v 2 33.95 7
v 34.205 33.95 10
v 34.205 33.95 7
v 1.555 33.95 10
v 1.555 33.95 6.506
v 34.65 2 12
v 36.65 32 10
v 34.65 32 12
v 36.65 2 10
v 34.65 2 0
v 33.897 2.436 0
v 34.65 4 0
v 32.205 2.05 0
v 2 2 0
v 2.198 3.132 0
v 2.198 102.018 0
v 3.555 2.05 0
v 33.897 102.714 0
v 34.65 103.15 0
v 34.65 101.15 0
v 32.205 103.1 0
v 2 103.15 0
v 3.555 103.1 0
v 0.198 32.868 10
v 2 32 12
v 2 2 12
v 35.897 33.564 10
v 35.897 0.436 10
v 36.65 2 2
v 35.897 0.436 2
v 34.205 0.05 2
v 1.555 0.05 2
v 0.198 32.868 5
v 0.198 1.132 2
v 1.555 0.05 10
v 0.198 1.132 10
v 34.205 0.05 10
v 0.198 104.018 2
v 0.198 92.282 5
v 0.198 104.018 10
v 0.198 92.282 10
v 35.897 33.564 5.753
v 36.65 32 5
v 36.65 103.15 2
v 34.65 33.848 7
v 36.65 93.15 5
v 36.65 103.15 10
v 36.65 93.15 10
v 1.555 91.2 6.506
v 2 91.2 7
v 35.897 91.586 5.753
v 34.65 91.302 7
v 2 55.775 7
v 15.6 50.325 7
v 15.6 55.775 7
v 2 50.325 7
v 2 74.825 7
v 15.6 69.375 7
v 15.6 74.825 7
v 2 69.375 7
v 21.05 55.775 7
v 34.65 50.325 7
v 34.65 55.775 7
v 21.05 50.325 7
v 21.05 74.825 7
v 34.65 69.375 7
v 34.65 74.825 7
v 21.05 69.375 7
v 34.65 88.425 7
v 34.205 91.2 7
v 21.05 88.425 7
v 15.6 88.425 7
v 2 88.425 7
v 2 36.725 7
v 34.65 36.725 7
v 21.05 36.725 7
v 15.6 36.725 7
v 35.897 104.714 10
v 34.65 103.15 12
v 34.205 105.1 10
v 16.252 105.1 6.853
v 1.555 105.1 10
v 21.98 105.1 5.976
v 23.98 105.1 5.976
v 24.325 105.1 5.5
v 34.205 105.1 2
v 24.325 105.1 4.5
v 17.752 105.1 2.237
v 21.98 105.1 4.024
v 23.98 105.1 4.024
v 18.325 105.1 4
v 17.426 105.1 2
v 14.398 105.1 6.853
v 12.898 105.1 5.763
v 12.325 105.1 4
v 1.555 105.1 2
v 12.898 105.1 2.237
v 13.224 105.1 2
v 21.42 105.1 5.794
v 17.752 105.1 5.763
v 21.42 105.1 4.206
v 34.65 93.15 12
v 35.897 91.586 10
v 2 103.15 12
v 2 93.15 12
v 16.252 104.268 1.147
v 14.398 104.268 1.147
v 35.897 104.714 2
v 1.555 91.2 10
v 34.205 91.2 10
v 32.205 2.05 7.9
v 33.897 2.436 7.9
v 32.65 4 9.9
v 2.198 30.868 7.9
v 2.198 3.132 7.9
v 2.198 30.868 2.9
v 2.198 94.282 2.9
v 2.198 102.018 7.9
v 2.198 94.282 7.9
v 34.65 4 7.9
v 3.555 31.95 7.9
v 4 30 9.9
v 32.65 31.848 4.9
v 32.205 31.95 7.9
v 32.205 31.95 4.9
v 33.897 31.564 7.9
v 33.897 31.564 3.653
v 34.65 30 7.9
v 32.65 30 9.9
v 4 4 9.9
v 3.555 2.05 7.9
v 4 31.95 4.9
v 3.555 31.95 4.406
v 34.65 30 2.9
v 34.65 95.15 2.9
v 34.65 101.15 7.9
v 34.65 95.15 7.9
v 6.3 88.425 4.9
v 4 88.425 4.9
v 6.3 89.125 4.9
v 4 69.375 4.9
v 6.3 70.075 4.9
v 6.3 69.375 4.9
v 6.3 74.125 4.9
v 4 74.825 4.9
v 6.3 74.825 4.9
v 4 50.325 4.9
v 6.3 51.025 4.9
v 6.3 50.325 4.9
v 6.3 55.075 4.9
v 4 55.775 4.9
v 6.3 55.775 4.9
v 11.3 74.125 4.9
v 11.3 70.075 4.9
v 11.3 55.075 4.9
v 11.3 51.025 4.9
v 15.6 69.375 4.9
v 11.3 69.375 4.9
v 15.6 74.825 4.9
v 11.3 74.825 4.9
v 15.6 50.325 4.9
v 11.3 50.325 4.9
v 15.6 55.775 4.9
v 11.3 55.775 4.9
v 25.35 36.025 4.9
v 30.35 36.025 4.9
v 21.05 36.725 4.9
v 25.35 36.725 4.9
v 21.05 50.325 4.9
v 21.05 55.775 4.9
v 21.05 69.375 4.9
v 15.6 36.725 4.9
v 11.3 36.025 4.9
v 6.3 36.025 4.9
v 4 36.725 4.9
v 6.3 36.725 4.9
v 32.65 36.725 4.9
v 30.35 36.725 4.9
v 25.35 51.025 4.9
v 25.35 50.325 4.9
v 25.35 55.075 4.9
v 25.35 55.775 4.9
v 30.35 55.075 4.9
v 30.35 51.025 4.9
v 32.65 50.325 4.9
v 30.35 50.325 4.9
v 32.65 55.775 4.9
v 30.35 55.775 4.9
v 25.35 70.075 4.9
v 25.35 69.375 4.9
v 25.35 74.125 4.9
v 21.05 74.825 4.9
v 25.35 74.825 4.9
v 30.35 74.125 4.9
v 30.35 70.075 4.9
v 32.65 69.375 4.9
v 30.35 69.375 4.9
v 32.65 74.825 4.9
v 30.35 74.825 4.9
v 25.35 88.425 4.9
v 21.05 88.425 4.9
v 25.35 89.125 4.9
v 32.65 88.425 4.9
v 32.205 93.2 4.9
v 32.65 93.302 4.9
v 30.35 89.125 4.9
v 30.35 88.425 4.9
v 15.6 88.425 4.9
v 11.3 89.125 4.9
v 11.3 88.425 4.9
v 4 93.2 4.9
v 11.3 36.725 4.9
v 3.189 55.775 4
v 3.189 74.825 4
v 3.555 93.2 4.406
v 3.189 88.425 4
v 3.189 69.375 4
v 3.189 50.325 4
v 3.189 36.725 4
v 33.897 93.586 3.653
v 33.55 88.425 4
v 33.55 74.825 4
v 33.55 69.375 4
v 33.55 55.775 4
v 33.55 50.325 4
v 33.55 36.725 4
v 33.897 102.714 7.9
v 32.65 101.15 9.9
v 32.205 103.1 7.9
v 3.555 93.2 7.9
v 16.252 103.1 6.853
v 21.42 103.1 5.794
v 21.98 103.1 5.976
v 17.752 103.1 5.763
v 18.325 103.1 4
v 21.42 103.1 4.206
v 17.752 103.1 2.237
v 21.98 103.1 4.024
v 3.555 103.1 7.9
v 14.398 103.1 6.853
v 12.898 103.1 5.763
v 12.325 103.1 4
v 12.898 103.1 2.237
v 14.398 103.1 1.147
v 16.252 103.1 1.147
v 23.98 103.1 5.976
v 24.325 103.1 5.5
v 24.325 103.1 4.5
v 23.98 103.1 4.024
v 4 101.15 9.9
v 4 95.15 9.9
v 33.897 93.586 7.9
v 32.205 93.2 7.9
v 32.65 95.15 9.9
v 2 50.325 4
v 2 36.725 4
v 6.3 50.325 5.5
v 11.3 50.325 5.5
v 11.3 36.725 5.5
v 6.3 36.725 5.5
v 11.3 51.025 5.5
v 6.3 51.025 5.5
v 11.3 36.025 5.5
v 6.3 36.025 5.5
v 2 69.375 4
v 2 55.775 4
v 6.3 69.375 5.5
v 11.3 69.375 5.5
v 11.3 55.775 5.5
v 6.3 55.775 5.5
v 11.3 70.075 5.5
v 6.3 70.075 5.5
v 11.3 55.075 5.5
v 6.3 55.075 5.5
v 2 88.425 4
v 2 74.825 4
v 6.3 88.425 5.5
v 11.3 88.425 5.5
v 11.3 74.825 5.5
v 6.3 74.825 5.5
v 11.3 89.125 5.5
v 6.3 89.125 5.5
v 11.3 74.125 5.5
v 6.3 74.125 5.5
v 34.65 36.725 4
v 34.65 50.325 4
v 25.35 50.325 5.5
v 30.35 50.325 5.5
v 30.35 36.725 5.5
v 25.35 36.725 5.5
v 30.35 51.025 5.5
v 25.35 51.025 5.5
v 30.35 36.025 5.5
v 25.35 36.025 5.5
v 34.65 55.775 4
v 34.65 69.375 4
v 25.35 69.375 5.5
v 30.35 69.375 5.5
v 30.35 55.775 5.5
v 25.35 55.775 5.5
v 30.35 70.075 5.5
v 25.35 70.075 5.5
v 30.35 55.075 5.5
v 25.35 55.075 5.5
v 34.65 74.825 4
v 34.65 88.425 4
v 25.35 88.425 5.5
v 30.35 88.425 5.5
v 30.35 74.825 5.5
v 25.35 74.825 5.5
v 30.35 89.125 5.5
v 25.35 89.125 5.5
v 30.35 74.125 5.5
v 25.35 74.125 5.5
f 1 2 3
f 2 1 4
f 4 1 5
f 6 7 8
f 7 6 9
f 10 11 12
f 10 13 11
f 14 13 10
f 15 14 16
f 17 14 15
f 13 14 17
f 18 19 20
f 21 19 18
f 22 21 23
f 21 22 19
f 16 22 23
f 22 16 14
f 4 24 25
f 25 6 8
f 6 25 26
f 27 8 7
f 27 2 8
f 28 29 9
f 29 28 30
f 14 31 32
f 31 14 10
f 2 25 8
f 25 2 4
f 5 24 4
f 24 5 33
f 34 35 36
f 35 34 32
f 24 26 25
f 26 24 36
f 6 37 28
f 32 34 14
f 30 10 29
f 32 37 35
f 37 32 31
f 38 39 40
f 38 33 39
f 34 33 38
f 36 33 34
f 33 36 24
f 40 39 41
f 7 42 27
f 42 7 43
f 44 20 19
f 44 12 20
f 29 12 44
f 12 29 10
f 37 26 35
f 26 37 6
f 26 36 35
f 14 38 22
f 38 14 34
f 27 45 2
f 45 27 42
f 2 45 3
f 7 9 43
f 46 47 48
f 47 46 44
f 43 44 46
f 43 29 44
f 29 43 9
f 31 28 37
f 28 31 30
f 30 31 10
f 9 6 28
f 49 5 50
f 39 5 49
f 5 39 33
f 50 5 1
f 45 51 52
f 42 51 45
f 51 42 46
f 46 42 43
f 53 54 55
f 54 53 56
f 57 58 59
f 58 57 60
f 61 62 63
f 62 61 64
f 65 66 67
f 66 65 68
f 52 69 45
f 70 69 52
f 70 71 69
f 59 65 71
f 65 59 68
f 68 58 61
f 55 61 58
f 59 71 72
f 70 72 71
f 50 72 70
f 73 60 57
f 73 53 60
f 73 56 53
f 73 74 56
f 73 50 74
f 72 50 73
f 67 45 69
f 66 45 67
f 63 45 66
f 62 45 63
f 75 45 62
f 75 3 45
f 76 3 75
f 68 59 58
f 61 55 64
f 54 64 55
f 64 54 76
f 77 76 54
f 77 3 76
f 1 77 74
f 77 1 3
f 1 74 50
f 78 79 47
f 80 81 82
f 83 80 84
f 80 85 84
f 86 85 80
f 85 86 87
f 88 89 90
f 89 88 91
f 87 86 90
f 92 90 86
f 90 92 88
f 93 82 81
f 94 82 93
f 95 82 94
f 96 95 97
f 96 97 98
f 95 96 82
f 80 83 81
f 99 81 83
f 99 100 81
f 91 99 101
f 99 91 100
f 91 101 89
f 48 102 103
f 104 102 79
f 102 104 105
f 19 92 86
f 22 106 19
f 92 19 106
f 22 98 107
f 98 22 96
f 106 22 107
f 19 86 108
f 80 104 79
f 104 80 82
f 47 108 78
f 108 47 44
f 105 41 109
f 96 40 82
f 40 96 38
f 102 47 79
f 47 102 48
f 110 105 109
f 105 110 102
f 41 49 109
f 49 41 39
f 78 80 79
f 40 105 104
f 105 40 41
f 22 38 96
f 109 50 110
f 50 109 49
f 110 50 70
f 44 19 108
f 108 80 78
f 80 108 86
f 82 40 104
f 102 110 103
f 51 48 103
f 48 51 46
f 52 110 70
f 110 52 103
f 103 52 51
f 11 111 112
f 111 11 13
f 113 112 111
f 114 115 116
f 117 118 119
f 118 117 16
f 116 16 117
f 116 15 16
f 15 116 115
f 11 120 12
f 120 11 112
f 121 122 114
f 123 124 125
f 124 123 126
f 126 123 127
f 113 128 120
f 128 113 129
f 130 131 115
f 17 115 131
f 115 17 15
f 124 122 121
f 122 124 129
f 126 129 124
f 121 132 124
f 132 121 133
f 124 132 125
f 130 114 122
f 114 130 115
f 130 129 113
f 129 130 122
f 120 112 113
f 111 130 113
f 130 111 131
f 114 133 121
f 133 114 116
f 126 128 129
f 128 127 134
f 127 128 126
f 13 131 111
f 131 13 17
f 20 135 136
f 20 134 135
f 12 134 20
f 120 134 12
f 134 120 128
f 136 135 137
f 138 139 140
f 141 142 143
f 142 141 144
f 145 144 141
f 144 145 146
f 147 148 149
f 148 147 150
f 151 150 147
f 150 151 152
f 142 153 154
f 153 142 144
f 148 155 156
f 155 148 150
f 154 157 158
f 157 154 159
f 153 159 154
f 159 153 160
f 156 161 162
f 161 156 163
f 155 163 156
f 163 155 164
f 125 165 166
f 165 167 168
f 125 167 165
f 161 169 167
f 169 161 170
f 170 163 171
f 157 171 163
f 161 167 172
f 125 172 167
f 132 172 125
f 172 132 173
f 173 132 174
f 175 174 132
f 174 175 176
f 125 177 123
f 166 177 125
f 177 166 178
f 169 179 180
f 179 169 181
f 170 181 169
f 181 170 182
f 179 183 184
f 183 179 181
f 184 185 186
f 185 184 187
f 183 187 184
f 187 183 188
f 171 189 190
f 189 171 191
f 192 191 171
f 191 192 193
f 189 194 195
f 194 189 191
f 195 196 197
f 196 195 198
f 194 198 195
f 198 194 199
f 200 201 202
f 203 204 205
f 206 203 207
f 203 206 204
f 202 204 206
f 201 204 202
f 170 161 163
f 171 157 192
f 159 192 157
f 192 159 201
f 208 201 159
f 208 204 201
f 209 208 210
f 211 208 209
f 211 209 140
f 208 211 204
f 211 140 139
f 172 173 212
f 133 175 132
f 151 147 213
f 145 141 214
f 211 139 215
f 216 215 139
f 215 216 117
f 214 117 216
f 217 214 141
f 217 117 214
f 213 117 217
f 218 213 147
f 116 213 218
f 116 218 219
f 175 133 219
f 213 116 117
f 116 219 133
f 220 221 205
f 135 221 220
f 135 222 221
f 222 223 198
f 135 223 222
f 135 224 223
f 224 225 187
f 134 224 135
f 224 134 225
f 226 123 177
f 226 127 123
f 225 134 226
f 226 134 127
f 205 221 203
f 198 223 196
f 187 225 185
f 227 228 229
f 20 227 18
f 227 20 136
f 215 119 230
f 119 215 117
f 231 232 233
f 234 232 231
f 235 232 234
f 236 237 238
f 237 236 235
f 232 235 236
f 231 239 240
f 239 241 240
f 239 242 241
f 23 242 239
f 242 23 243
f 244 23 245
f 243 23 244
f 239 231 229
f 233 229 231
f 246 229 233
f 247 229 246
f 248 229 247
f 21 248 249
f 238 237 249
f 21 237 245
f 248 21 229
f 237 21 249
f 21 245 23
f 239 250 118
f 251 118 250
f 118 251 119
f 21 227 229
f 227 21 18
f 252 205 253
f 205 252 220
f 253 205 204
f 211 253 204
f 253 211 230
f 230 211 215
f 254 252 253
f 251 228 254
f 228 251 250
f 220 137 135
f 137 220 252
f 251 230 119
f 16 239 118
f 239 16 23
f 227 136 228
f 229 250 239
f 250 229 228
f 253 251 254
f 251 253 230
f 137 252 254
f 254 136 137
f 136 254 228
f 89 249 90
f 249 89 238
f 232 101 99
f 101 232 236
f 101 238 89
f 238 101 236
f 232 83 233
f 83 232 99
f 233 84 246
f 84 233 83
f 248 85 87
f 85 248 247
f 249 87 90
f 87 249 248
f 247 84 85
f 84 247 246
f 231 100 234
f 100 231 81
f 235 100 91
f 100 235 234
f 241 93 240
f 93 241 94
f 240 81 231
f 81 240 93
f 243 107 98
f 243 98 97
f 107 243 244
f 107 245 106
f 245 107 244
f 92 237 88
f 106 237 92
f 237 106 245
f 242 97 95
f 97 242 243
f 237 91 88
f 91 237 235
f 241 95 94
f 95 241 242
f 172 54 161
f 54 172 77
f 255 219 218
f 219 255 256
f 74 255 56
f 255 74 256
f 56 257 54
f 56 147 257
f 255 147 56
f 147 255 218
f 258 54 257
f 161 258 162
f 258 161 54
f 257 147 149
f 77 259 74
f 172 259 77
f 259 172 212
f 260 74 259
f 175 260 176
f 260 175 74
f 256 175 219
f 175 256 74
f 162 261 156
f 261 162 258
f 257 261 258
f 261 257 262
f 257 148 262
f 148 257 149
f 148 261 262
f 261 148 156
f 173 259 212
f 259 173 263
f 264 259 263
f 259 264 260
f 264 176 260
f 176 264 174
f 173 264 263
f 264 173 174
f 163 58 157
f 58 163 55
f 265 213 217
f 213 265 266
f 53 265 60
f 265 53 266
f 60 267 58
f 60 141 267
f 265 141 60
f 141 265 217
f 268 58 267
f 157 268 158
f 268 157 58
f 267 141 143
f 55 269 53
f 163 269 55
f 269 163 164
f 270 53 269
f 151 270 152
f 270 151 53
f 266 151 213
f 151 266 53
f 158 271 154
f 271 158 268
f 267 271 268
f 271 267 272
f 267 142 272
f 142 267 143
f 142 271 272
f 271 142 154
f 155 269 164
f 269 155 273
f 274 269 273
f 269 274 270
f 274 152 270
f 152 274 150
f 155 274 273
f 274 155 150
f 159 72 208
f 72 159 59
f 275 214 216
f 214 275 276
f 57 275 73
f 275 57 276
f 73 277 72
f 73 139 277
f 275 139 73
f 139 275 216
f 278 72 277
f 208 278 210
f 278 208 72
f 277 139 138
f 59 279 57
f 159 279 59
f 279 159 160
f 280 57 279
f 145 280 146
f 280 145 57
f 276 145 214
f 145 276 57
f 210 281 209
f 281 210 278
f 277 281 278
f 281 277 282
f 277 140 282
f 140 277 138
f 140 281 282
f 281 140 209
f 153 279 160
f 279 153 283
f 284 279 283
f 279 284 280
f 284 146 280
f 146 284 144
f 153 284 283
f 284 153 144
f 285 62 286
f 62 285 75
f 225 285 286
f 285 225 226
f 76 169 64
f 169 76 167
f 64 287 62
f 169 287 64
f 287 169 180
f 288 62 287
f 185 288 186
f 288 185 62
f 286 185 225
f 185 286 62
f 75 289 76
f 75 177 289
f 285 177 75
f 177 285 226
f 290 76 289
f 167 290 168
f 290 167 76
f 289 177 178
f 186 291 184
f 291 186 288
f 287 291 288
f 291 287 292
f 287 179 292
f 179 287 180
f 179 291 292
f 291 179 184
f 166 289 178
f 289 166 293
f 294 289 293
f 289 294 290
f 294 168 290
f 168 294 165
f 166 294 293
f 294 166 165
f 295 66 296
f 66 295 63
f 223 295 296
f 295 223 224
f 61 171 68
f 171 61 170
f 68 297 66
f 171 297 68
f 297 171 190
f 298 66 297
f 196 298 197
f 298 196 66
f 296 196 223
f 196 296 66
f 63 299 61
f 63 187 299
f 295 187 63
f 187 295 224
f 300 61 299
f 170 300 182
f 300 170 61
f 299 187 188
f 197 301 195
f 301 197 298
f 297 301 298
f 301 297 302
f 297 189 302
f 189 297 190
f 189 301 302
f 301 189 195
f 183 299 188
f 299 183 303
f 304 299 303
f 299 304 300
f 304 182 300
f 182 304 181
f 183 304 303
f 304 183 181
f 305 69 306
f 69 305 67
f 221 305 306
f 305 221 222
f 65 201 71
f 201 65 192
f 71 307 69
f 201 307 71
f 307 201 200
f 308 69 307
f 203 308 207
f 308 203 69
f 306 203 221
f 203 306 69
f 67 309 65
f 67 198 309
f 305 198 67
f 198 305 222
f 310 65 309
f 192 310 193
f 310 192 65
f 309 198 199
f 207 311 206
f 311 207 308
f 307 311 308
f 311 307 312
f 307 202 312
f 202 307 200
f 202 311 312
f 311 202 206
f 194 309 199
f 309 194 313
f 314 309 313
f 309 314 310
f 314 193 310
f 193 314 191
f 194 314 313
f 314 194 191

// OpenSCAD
// file: cherrymx.scad
switch_side_outer=19.1;
switch_sep = 19.05;
switch_side_inner=13.6;
switch_height=3;
plate_thick_d=0;
plate_thick=1.5 + plate_thick_d;
inset_h=switch_height - plate_thick;
inset_w=5;
inset_d=0.7;
outset_d=0.2;
switch_pcb_to_plate_top = 4.7;

module inset() {
    translate([0, switch_side_inner/2 + inset_d/2, (switch_height)/2 -inset_h - plate_thick])
        cube([inset_w, inset_d, 2*inset_h], center=true);
}

module outset() {
    translate([0, switch_side_inner/2 - outset_d/2, switch_height/2-plate_thick/2])
        difference() {
            cube([inset_w,outset_d,plate_thick], center=true);
            cube([inset_w-2.5,outset_d,plate_thick], center=true);
        }
}

module switch_pos(height=switch_height, center_height=false) {
    if (center_height) {
        cube([switch_side_outer, switch_side_outer, height], center=true);
    } else {
        translate([0, 0, height/2])
            cube([switch_side_outer, switch_side_outer, height], center=true);
    }
}

module SwitchPos2D() {
       square(switch_side_outer, center=true);
}

module SwitchNeg2D() {
       square(switch_side_inner, center=true);
}

module switch_neg_cube() {
    translate([0,0,switch_height/2])
        cube([switch_side_inner, switch_side_inner, switch_height], center=true);
}

module switch_neg(switch_height_mult=1) {
    translate([0,0,switch_height/2]) {
        difference() {
            cube([switch_side_inner, switch_side_inner, switch_height_mult*switch_height], center=true);
            *outset();
            *mirror([0,1,0])
                outset();
        }
        inset();
        mirror([0,1,0])
            inset();
    }
}

module switch(side_outer=switch_side_outer) {
    difference() {
        switch_pos(side_outer);
        switch_neg(1);
    }
}

module keycap(center=true) {
  cube([18, 18, 8.5],center=center);
}

function switch_corner_outer(offset, corner) = offset +
  ( (corner == "ne" ? [switch_side_outer/2, switch_side_outer/2, 0] :
     (corner == "se" ? [switch_side_outer/2, -switch_side_outer/2, 0] :
      (corner == "sw" ? [-switch_side_outer/2, -switch_side_outer/2, 0] :
       ([-switch_side_outer/2, switch_side_outer/2, 0])))) );
// main file
include <cherrymx.scad>


module TriangleRightAngle(w, h) {
    polygon([[0,0], [w,0], [w,h]]);
}

module BoxChamfer(w,l,h,chamfer) {
    translate([chamfer,chamfer,0]) {
        minkowski() {
            cube([w-2*chamfer,l-2*chamfer,h-2*chamfer]);
            union() {
                translate([0,0,chamfer])
                    cylinder(h=chamfer, r1=chamfer, r2=0);
                cylinder(h=chamfer, r1=0, r2=chamfer);
            }
        }
    }
}

module BoxChamferTop(w,l,h,chamfer) {
    translate([chamfer,chamfer,0]) {
        minkowski() {
            cube([w-2*chamfer,l-2*chamfer,h-chamfer]);
            cylinder(h=chamfer, r1=chamfer, r2=0);
        }
    }
}

module BoxFilletSides(x, y, z, chamfer) {
    translate([chamfer,chamfer,0]) {
        minkowski() {
            cube([x-2*chamfer,y-2*chamfer,z-2*chamfer]);
            cylinder(h=chamfer, r=chamfer);
        }
    }
}

chamfer = 2;
wall_thick = 2;
width_outer = switch_side_inner + switch_sep + 2*chamfer;
width_inner = width_outer - 2*wall_thick;
height_high_inner = 10;
height_high_outer = height_high_inner + wall_thick;
height_low_inner = 5;
height_low_outer = height_low_inner + wall_thick;

box1_inner_y = 30;
box1_outer_y = box1_inner_y + 2*wall_thick;

box2_outer_y = 3*switch_sep + 4*chamfer;
box2_inner_y = box2_outer_y - 2*wall_thick;
box2_pos_z = box1_outer_y - 2*chamfer;
box2_pos = [0, box2_pos_z, 0];

box3_inner_y = 10;
box3_outer_y = box3_inner_y + 2*wall_thick;
box3_pos = box2_pos + [0, box2_outer_y - 2*chamfer, 0];

outer_z = box2_pos_z + box2_outer_y + box3_outer_y;

module ShellPositive() {
            BoxChamfer(width_outer, box1_outer_y, height_high_outer, chamfer);
        translate(box2_pos)
            BoxChamfer(width_outer, box2_outer_y, height_low_outer, chamfer);
        translate(box3_pos)
            BoxChamfer(width_outer, box3_outer_y, height_high_outer, chamfer);
}

module ShellNegative() {
    translate([wall_thick, wall_thick, -.1]) {
        BoxChamferTop(width_inner, box1_inner_y, height_high_inner, chamfer);
        translate(box2_pos + [0, -wall_thick*2, 0])
            BoxChamferTop(width_inner, box2_inner_y+wall_thick*4, height_low_inner, chamfer);
        translate(box3_pos)
            BoxChamferTop(width_inner, box3_inner_y, height_high_inner, chamfer);
    }
}

pcb_pos_z = chamfer + 1;
pcb_z = 1;
module SensorHoles() {
    translate([width_outer/2, outer_z-1.5*wall_thick, pcb_z + pcb_pos_z]) {
        translate([3, 0, 0])
            rotate([90, 0, 0])
                BoxFilletSides(3, 2, 2*wall_thick, .5);
        translate([-3, 0, 0])
            rotate([90, 0, 0])
                cylinder(h = 2*wall_thick, r=3);
    }
}

module SwitchHoles() {
    translate (
        box2_pos +
        [wall_thick+switch_side_inner/2, chamfer+wall_thick+switch_sep/2, height_low_outer - switch_height])
    for (col = [0:1]) {
        for (row = [0:2]) {
            translate([col*switch_sep, row*switch_sep, 0])
                switch_neg();
        }
    }
}

difference() {
    ShellPositive();
    ShellNegative();
    SensorHoles();
    SwitchHoles();
}
